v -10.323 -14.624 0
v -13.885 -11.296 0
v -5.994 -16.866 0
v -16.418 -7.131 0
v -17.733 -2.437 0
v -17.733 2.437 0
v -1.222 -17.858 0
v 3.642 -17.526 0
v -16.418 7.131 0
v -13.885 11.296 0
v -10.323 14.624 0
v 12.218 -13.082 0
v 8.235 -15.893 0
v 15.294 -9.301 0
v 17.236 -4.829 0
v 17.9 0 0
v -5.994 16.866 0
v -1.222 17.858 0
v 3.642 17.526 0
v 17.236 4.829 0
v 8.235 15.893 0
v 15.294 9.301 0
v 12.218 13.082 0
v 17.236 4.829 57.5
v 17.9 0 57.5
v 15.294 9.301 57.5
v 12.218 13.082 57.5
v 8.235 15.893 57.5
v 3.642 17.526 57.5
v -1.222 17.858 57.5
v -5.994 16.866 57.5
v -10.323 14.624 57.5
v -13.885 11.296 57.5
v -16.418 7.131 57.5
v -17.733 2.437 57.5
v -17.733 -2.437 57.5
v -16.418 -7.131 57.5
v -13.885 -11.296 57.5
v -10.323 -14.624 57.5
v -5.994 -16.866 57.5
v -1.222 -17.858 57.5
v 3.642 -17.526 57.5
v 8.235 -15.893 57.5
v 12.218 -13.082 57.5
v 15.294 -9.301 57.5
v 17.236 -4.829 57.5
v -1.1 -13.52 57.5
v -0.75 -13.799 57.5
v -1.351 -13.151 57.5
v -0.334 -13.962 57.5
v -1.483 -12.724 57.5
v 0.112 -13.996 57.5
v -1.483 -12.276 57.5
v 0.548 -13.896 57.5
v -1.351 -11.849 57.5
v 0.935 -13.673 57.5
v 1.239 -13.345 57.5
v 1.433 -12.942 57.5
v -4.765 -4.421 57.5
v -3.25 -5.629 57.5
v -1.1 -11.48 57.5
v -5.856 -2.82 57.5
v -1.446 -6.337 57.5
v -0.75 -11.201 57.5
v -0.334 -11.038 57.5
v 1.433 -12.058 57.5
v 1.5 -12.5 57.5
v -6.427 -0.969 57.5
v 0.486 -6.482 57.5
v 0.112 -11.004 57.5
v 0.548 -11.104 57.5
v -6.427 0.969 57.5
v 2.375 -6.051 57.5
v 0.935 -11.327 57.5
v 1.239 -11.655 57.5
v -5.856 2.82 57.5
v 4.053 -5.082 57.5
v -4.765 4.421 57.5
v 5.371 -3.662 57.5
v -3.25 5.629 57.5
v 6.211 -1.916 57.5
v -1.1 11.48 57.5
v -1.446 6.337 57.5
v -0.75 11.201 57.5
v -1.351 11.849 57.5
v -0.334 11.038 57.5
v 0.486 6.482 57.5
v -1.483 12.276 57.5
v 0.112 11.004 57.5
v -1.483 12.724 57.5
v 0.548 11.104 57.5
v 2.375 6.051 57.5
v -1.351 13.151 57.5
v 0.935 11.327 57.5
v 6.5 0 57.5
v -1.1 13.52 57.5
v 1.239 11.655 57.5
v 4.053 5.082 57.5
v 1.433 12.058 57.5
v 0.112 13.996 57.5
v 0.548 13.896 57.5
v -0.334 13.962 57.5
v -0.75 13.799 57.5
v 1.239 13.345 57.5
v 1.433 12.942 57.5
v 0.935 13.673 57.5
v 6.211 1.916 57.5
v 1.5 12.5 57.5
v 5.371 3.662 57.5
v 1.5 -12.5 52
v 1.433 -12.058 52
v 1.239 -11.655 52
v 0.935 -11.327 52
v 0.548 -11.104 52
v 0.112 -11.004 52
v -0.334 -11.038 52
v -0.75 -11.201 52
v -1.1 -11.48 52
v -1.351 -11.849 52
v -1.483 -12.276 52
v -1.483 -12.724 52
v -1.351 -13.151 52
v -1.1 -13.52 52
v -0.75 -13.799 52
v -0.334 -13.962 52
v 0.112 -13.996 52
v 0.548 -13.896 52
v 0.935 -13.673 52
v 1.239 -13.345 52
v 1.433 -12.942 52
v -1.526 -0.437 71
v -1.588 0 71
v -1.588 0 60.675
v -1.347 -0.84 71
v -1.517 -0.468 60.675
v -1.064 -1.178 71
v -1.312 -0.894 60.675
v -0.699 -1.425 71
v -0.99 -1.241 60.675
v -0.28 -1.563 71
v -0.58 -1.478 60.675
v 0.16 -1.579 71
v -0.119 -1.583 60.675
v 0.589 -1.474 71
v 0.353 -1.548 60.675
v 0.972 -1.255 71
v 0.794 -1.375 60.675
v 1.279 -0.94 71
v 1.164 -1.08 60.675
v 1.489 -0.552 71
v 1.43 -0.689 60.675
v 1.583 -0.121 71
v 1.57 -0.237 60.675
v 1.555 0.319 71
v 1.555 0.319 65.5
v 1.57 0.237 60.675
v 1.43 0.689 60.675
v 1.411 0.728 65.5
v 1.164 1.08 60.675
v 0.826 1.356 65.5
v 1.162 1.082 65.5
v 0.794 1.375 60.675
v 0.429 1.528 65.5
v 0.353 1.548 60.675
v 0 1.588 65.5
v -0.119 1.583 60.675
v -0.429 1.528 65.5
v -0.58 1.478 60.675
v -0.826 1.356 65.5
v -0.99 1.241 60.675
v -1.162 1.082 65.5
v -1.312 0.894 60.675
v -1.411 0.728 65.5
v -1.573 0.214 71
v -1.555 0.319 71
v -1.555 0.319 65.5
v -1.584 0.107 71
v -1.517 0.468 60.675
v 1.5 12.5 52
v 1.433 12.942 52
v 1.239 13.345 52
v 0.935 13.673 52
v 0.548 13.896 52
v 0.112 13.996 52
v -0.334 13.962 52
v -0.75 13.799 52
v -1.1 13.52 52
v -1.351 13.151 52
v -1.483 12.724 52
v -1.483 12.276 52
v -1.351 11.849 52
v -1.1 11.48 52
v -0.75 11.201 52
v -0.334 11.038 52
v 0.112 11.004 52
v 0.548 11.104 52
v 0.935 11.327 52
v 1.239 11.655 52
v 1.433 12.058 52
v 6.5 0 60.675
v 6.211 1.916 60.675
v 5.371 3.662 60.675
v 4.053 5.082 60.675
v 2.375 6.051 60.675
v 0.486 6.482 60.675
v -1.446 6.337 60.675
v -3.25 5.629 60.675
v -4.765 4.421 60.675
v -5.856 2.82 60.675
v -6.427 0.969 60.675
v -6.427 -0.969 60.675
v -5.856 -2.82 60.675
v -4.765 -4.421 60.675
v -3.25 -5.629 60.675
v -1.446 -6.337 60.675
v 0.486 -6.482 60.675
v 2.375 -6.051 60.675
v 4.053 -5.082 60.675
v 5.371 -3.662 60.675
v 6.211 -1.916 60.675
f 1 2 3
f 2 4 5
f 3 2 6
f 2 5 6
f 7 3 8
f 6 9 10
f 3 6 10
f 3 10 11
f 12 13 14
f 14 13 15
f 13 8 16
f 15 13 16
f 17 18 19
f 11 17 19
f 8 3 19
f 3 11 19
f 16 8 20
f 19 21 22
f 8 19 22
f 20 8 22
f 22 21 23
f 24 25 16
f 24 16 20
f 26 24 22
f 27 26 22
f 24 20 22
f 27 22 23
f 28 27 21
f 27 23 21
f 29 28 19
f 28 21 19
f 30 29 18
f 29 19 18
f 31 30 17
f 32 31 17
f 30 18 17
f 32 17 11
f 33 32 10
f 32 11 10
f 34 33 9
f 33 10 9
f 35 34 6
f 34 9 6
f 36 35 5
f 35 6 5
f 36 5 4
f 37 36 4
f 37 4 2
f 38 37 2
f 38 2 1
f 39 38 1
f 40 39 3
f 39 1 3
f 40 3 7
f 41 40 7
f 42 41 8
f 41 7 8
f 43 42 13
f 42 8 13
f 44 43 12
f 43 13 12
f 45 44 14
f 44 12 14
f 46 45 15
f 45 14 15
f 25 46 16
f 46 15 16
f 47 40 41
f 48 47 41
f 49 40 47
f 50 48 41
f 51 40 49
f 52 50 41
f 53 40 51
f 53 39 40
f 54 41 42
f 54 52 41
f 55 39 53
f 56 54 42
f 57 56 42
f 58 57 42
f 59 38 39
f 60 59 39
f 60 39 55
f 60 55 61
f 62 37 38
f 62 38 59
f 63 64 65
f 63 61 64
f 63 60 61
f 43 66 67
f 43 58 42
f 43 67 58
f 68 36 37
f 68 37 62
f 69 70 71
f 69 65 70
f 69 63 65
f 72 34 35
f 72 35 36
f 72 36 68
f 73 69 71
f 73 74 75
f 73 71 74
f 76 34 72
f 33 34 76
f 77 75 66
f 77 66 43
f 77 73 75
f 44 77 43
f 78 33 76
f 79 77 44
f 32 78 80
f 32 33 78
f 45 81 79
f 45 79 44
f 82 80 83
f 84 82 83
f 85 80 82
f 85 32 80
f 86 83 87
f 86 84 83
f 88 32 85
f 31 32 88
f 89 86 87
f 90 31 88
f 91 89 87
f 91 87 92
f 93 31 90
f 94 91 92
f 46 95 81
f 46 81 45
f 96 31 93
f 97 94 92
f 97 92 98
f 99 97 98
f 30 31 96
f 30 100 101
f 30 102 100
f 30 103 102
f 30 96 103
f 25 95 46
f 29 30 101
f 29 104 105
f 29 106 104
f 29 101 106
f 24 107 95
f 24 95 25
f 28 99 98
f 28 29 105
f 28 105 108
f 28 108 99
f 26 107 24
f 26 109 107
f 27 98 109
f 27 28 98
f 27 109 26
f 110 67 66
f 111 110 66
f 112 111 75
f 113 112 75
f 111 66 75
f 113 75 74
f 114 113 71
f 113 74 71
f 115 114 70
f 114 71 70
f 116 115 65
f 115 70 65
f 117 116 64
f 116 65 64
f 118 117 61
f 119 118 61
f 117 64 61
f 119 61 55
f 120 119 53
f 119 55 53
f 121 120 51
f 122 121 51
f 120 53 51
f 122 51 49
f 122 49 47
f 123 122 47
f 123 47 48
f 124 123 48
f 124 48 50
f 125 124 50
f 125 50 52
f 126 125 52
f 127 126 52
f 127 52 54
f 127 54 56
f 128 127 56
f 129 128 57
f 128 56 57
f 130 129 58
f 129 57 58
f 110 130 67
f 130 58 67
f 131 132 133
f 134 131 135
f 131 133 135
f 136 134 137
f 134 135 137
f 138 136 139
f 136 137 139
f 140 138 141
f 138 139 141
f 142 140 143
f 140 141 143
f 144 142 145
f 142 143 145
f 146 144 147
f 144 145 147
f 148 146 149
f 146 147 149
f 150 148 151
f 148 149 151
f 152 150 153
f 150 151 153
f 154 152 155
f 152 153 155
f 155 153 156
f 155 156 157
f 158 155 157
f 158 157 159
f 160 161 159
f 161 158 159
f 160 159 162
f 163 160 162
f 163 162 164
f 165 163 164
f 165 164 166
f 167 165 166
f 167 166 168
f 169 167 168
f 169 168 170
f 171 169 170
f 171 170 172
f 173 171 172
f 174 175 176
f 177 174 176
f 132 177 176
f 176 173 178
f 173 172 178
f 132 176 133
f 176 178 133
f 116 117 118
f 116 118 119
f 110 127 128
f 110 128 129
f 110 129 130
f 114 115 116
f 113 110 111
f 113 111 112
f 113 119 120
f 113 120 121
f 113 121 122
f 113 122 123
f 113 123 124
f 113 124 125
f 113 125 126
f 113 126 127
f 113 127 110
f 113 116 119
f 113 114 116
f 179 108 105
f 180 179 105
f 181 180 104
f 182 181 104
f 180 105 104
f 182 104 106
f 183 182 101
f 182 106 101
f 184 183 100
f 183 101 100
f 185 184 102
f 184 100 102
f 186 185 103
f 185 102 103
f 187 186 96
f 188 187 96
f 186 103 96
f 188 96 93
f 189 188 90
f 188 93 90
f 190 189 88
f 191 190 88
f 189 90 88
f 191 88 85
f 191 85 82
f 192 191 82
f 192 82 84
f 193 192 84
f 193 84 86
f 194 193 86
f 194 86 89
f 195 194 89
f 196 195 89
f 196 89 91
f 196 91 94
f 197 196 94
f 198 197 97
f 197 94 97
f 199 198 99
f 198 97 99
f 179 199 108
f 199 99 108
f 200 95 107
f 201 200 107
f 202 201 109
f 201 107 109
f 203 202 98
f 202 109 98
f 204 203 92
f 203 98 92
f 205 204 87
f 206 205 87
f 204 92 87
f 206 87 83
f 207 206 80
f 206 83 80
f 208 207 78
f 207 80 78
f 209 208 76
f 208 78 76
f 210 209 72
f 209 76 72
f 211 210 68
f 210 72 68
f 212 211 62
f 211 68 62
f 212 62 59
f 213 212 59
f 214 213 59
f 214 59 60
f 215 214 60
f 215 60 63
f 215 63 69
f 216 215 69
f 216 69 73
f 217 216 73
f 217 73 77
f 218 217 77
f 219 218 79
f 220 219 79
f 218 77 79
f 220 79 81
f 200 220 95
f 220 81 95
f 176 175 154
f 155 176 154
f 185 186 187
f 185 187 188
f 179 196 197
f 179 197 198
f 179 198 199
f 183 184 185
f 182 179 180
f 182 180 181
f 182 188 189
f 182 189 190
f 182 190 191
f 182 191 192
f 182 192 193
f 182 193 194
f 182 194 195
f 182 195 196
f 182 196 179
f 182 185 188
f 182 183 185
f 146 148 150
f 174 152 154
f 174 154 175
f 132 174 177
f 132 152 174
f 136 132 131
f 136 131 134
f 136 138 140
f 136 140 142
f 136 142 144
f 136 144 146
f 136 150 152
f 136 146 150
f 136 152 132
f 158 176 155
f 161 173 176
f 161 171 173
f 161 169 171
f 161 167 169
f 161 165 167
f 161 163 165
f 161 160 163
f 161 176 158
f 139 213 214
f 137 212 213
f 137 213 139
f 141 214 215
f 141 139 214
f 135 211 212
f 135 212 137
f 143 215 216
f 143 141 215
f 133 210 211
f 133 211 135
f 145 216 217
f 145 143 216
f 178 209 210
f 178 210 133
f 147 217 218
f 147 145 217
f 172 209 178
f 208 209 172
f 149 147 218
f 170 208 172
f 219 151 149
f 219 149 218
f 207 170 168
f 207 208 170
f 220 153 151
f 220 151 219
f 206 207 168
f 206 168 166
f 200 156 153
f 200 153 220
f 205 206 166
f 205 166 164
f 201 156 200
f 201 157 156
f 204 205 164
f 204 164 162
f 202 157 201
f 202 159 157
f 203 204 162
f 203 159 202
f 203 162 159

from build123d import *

# Parameters (mm, degrees)
SKETCH1_R           = 17.9
BOSS_EXTRUDE1_DEPTH = 57.5
SKETCH2_R           = 6.5
BOSS_EXTRUDE2_DEPTH = 3.175
SKETCH3_R           = 1.5875
BOSS_EXTRUDE3_DEPTH = 10.325
CUT_EXTRUDE1_DEPTH  = 5.5
SKETCH5_R           = 1.5
CUT_EXTRUDE2_DEPTH  = 5.5


with BuildPart() as part:
    # Sketch1 → Boss-Extrude1 (new body)
    with BuildSketch(Plane.XY):
        Circle(SKETCH1_R)
    extrude(amount=BOSS_EXTRUDE1_DEPTH)

    # Sketch2 → Boss-Extrude2 (add)
    with BuildSketch(Plane.XY.offset(57.5)):
        Circle(SKETCH2_R)
    extrude(amount=BOSS_EXTRUDE2_DEPTH)

    # Sketch3 → Boss-Extrude3 (add)
    with BuildSketch(Plane.XY.offset(60.675)):
        with Locations(Location((0, 0, 0), (0, 0, 180))):
            Circle(SKETCH3_R)
    extrude(amount=BOSS_EXTRUDE3_DEPTH)

    # Sketch4 → Cut-Extrude1 (cut)
    with BuildSketch(Plane.XY.offset(71)):
        with BuildLine():
            Line((-1.555064123, 0.319267636), (1.555064123, 0.319267636))
            ThreePointArc((1.555064123, 0.319267636), (0, 1.603005123), (-1.555064123, 0.319267636))
        make_face()
    extrude(amount=-CUT_EXTRUDE1_DEPTH, mode=Mode.SUBTRACT)

    # Sketch5 → Cut-Extrude2 (cut)
    with BuildSketch(Plane.XY.offset(57.5)):
        with Locations((0, 12.5)):
            Circle(SKETCH5_R)
        with Locations((0, -12.5)):
            Circle(SKETCH5_R)
    extrude(amount=-CUT_EXTRUDE2_DEPTH, mode=Mode.SUBTRACT)


solid = part.part
